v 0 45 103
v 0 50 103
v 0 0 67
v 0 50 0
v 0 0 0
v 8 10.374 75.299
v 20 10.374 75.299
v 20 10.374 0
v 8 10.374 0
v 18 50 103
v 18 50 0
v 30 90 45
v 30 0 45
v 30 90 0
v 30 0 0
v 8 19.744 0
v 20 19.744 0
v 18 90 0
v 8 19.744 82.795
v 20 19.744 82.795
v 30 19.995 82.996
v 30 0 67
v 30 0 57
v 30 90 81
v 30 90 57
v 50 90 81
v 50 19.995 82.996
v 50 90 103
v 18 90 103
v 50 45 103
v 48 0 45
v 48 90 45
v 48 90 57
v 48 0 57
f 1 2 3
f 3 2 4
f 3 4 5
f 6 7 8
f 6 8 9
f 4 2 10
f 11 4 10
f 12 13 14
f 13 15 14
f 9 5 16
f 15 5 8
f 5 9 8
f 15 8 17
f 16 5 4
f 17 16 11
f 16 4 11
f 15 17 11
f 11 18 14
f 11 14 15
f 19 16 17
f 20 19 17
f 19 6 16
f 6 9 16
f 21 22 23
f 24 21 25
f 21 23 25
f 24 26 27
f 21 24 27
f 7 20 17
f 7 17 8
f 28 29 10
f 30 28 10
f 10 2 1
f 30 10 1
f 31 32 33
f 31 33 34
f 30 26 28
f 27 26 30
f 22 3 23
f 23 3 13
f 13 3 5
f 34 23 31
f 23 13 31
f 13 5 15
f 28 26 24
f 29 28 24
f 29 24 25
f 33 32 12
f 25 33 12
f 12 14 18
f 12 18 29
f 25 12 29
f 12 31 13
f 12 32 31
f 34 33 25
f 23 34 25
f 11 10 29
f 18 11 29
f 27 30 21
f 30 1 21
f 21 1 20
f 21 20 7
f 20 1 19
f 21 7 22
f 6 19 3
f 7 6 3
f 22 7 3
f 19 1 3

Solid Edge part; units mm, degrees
sketch "Sketch1" plane through (0, 0, 0) normal (0, 0, 1) x (1, 0, 0)
  line L0 (30, 0) -> (30, 90)
  line L1 (30, 90) -> (0, 90)
  line L2 (0, 90) -> (0, 0)
  line L3 (0, 0) -> (30, 0)
extrude "Protrusion1" add sketch "Sketch1" along normal blind 45
sketch "Sketch2" plane through (15, 45, 45) normal (0, 0, 1) x (1, 0, 0)
  line L0 (-15, 45) -> (33, 45)
  line L1 (33, 45) -> (33, -45)
  line L2 (33, -45) -> (-15, -45)
  line L3 (-15, -45) -> (-15, 45)
extrude "ExtrudedProtrusion_2" add sketch "Sketch2" along normal blind 12
sketch "Sketch3" plane through (24, 45, 57) normal (0, 0, 1) x (1, 0, 0)
  line L0 (-24, -45) -> (6, -45)
  line L1 (6, -45) -> (6, 45)
  line L2 (6, 45) -> (-24, 45)
  line L3 (-24, 45) -> (-24, -45)
extrude "ExtrudedProtrusion_3" add sketch "Sketch3" along normal blind 10
sketch "Sketch4" plane through (0, 45, 33.5) normal (-1, 0, 0) x (0, 0, 1)
  line L0 (69.5, 45) -> (69.5, 0)
  line L1 (69.5, 0) -> (33.5, -45)
  line L2 (33.5, 45) -> (33.5, -45)
  line L3 (33.5, 45) -> (69.5, 45)
extrude "ExtrudedProtrusion_5" add sketch "Sketch4" against normal blind 50
sketch "Sketch5" plane through (50, 45, 85) normal (1, 0, 0) x (0, 1, 0)
  line L0 (45, -18) -> (45, -4)
  line L1 (45, -4) -> (-25.0048, -2.0039)
  line L2 (-25.0048, -2.0039) -> (-45, -18)
  line L3 (-45, -18) -> (45, -18)
extrude "ExtrudedCutout_6" cut sketch "Sketch5" against normal blind 20
sketch "Sketch6" plane through (15, 45, 0) normal (0, 0, -1) x (0, 1, 0)
  line L0 (-25.2561, -7) -> (-25.2561, 5)
  line L1 (-25.2561, 5) -> (-34.6265, 5)
  line L2 (-34.6265, 5) -> (-34.6265, -7)
  line L3 (-34.6265, -7) -> (-25.2561, -7)
extrude "ExtrudedCutout_7" cut sketch "Sketch6" against normal blind 588.5853
sketch "Sketch7" plane through (25, 67.5, 103) normal (0, 0, 1) x (0, 1, 0)
  line L0 (22.5, 25) -> (-17.5, 25)
  line L1 (-17.5, 25) -> (-17.5, 7)
  line L2 (-17.5, 7) -> (22.5, 7)
  line L3 (22.5, 7) -> (22.5, 25)
extrude "ExtrudedCutout_8" cut sketch "Sketch7" against normal blind 143.8541
